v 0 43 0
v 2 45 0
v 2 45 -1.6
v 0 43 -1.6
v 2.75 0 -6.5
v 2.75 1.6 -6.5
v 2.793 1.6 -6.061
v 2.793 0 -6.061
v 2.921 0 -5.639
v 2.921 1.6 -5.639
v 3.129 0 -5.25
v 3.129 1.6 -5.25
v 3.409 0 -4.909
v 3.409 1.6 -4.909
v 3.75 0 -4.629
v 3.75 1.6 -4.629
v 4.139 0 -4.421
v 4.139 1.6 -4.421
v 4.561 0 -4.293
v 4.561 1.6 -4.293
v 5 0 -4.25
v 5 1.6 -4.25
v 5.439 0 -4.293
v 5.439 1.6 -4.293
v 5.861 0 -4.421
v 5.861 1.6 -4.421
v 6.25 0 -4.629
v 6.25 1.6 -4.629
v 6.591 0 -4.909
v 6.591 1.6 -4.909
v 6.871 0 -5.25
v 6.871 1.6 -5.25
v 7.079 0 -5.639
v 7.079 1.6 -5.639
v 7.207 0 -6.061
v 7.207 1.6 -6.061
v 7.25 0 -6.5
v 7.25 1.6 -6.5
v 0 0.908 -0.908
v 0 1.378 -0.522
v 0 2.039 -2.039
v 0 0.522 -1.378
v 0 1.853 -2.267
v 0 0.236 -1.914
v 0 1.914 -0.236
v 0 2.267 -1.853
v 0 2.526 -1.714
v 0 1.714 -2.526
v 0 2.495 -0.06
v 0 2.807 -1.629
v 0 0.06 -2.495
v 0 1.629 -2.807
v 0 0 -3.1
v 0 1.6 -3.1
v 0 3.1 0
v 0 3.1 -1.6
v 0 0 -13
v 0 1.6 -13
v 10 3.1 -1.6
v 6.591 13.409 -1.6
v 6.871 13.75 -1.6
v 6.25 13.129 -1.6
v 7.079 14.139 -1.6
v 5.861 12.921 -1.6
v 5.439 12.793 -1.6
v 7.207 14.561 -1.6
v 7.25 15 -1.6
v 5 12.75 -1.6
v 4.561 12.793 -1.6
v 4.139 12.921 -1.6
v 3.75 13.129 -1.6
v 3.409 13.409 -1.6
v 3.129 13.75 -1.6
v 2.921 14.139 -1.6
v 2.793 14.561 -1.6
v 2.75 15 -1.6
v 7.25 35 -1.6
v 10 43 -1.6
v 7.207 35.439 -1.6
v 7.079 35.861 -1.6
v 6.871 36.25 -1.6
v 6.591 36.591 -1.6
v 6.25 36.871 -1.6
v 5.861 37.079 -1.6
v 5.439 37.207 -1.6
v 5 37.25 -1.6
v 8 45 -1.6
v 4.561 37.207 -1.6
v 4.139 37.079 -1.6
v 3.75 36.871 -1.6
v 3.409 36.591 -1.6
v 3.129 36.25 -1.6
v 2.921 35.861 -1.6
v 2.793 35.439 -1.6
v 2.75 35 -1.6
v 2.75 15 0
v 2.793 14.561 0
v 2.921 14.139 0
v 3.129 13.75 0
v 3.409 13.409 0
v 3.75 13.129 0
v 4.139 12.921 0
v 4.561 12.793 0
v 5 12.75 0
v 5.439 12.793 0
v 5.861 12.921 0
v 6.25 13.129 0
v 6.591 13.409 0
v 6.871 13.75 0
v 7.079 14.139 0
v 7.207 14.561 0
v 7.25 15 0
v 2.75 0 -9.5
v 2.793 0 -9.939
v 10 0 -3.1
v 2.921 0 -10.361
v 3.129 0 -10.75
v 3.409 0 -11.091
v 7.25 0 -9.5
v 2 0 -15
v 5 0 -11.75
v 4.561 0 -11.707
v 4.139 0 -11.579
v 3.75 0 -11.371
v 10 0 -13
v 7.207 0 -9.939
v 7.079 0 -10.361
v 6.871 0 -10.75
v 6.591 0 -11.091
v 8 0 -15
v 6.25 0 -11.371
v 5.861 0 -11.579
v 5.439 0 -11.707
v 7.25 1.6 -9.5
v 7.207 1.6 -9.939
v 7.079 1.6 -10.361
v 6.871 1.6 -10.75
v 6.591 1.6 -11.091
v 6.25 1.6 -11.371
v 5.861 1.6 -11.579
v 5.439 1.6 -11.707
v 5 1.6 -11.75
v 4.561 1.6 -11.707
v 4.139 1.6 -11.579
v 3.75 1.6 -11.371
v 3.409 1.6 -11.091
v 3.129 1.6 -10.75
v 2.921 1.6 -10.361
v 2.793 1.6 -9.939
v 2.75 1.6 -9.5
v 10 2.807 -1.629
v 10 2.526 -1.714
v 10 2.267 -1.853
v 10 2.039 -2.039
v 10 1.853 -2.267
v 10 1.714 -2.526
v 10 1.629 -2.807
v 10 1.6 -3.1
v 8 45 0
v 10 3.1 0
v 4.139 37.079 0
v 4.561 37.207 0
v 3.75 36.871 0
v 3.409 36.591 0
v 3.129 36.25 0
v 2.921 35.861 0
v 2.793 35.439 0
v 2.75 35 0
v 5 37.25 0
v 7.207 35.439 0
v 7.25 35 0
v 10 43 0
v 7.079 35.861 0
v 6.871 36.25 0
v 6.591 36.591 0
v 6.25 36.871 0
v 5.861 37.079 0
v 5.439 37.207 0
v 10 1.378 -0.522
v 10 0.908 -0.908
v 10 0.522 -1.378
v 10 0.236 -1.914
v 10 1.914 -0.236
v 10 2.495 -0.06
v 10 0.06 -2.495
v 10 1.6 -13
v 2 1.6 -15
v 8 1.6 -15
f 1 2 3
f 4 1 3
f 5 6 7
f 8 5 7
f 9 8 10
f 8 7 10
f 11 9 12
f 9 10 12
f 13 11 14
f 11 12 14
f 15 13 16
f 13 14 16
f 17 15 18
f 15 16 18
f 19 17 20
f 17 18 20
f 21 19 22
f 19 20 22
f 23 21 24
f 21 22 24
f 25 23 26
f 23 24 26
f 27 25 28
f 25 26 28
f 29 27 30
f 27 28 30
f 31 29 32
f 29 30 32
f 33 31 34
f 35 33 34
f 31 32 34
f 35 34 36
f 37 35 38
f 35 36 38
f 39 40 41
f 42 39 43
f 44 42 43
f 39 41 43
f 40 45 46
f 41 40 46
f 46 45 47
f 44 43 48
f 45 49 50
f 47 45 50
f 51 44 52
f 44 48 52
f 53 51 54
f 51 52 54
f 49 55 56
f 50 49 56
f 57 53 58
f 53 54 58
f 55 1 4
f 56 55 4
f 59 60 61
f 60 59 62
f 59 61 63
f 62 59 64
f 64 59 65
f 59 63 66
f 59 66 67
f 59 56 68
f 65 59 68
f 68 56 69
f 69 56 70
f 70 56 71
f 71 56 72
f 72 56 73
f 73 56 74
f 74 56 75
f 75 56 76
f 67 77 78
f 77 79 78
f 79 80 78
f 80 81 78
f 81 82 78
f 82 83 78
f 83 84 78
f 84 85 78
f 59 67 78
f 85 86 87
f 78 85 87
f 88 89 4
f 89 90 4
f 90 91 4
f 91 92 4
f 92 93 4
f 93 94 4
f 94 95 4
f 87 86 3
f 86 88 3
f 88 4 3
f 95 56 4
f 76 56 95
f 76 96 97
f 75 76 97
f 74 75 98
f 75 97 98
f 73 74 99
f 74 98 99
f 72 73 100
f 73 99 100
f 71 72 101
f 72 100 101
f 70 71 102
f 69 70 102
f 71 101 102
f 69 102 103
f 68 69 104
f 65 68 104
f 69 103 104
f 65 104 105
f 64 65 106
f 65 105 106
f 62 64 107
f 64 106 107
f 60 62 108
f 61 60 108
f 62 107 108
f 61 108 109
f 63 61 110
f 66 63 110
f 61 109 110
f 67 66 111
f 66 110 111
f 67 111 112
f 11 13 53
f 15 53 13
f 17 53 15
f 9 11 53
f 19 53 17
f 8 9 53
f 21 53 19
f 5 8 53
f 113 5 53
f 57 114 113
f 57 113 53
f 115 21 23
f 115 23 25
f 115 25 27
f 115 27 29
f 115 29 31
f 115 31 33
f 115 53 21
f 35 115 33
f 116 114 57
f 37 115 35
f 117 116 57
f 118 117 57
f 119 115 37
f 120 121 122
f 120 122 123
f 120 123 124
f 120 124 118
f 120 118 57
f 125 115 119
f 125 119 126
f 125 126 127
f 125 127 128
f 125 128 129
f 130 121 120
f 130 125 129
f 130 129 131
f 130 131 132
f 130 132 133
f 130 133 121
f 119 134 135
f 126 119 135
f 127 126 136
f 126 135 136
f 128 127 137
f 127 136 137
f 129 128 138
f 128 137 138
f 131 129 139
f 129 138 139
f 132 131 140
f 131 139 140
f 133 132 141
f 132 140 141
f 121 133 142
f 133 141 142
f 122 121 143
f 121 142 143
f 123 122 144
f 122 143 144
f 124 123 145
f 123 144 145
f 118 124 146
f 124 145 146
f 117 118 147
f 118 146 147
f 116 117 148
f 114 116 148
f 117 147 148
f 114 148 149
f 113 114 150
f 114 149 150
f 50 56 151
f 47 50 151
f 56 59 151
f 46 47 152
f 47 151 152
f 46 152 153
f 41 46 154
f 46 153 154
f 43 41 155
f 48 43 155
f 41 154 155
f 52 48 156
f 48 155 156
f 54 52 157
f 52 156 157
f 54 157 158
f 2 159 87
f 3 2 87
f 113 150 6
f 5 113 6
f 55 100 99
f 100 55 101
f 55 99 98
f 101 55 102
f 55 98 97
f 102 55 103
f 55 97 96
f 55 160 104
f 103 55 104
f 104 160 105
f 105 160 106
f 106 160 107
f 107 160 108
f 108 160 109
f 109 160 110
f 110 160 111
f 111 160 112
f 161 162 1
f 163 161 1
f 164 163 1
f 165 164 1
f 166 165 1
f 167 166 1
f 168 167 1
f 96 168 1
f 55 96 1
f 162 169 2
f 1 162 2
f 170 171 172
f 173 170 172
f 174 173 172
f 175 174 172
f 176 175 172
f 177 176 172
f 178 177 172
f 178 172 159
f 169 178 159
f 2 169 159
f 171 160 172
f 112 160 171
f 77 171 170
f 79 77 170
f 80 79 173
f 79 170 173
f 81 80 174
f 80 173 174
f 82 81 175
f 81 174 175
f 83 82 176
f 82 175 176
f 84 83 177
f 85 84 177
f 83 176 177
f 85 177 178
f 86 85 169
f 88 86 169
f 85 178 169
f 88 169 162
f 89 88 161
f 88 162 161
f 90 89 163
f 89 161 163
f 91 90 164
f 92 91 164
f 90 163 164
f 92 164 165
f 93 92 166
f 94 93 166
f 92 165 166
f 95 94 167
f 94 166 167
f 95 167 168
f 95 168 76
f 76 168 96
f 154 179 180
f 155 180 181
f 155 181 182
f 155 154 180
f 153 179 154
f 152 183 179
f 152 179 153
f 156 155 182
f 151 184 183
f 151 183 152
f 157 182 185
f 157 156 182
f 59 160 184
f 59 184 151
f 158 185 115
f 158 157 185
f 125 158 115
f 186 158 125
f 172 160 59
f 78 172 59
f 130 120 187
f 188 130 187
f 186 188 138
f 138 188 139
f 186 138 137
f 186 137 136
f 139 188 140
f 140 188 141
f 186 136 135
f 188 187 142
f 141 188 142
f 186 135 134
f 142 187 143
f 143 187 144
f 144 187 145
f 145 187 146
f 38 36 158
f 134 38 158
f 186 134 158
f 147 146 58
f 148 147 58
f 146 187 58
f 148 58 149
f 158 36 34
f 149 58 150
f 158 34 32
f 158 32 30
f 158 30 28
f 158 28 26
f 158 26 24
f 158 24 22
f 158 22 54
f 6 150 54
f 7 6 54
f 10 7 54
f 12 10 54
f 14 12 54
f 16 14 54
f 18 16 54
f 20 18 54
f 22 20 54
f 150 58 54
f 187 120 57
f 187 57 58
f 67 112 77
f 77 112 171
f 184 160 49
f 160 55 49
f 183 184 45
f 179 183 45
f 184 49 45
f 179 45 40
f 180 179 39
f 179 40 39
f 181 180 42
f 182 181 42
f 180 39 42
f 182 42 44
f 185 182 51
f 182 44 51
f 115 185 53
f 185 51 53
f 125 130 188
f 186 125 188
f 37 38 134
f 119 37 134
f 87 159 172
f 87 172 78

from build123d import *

# Parameters (mm, degrees)
SKETCH1_W           = 15
SKETCH1_H           = 45
BOSS_EXTRUDE1_DEPTH = 10
SKETCH2_W           = 13.4
SKETCH2_H           = 43.4
CUT_EXTRUDE1_DEPTH  = 49.476798574
CUT_EXTRUDE2_DEPTH  = 47.995318916
CUT_EXTRUDE3_DEPTH  = 49.476798574
CHAMFER1_SIZE       = 2
FILLET1_R           = 1.5
FILLET2_R           = 3.1


with BuildPart() as part:
    # Sketch1 → Boss-Extrude1 (new body)
    with BuildSketch(Plane(origin=(10, 0, 0), x_dir=(0, 0, -1), z_dir=(1, 0, 0))):
        with Locations((7.5, 22.5)):
            Rectangle(SKETCH1_W, SKETCH1_H)
    extrude(amount=-BOSS_EXTRUDE1_DEPTH)

    # Sketch2 → Cut-Extrude1 (cut, through all)
    with BuildSketch(Plane.ZY):
        with Locations((-8.3, 23.3)):
            Rectangle(SKETCH2_W, SKETCH2_H)
    extrude(amount=-CUT_EXTRUDE1_DEPTH, mode=Mode.SUBTRACT)

    # Sketch3 → Cut-Extrude2 (cut, through all)
    with BuildSketch(Plane(origin=(0, 1.6, 0), x_dir=(-1, 0, 0), z_dir=(0, 1, 0))):
        with BuildLine():
            Line((-2.75, -9.5), (-2.75, -6.5))
            ThreePointArc((-2.75, -6.5), (-5, -4.25), (-7.25, -6.5))
            Line((-7.25, -6.5), (-7.25, -9.5))
            ThreePointArc((-7.25, -9.5), (-5, -11.75), (-2.75, -9.5))
        make_face()
    extrude(amount=-CUT_EXTRUDE2_DEPTH, mode=Mode.SUBTRACT)

    # Sketch4 → Cut-Extrude3 (cut, through all)
    with BuildSketch(Plane.XY):
        with BuildLine():
            Line((7.25, 15), (7.25, 35))
            ThreePointArc((7.25, 35), (5, 37.25), (2.75, 35))
            Line((2.75, 35), (2.75, 15))
            ThreePointArc((2.75, 15), (5, 12.75), (7.25, 15))
        make_face()
    extrude(amount=-CUT_EXTRUDE3_DEPTH, mode=Mode.SUBTRACT)

    # Chamfer1
    chamfer1_edges = [part.edges().sort_by_distance(p)[0] for p in [
        (0, 0.8, -15),
        (10, 45, -0.8),
        (0, 45, -0.8),
        (10, 0.8, -15),
    ]]
    chamfer(chamfer1_edges, length=CHAMFER1_SIZE)

    # Fillet1
    fillet1_edges = [part.edges().sort_by_distance(p)[0] for p in [
        (5, 1.6, -1.6),
    ]]
    fillet(fillet1_edges, radius=FILLET1_R)

    # Fillet2
    fillet2_edges = [part.edges().sort_by_distance(p)[0] for p in [
        (5, 0, 0),
    ]]
    fillet(fillet2_edges, radius=FILLET2_R)


solid = part.part
